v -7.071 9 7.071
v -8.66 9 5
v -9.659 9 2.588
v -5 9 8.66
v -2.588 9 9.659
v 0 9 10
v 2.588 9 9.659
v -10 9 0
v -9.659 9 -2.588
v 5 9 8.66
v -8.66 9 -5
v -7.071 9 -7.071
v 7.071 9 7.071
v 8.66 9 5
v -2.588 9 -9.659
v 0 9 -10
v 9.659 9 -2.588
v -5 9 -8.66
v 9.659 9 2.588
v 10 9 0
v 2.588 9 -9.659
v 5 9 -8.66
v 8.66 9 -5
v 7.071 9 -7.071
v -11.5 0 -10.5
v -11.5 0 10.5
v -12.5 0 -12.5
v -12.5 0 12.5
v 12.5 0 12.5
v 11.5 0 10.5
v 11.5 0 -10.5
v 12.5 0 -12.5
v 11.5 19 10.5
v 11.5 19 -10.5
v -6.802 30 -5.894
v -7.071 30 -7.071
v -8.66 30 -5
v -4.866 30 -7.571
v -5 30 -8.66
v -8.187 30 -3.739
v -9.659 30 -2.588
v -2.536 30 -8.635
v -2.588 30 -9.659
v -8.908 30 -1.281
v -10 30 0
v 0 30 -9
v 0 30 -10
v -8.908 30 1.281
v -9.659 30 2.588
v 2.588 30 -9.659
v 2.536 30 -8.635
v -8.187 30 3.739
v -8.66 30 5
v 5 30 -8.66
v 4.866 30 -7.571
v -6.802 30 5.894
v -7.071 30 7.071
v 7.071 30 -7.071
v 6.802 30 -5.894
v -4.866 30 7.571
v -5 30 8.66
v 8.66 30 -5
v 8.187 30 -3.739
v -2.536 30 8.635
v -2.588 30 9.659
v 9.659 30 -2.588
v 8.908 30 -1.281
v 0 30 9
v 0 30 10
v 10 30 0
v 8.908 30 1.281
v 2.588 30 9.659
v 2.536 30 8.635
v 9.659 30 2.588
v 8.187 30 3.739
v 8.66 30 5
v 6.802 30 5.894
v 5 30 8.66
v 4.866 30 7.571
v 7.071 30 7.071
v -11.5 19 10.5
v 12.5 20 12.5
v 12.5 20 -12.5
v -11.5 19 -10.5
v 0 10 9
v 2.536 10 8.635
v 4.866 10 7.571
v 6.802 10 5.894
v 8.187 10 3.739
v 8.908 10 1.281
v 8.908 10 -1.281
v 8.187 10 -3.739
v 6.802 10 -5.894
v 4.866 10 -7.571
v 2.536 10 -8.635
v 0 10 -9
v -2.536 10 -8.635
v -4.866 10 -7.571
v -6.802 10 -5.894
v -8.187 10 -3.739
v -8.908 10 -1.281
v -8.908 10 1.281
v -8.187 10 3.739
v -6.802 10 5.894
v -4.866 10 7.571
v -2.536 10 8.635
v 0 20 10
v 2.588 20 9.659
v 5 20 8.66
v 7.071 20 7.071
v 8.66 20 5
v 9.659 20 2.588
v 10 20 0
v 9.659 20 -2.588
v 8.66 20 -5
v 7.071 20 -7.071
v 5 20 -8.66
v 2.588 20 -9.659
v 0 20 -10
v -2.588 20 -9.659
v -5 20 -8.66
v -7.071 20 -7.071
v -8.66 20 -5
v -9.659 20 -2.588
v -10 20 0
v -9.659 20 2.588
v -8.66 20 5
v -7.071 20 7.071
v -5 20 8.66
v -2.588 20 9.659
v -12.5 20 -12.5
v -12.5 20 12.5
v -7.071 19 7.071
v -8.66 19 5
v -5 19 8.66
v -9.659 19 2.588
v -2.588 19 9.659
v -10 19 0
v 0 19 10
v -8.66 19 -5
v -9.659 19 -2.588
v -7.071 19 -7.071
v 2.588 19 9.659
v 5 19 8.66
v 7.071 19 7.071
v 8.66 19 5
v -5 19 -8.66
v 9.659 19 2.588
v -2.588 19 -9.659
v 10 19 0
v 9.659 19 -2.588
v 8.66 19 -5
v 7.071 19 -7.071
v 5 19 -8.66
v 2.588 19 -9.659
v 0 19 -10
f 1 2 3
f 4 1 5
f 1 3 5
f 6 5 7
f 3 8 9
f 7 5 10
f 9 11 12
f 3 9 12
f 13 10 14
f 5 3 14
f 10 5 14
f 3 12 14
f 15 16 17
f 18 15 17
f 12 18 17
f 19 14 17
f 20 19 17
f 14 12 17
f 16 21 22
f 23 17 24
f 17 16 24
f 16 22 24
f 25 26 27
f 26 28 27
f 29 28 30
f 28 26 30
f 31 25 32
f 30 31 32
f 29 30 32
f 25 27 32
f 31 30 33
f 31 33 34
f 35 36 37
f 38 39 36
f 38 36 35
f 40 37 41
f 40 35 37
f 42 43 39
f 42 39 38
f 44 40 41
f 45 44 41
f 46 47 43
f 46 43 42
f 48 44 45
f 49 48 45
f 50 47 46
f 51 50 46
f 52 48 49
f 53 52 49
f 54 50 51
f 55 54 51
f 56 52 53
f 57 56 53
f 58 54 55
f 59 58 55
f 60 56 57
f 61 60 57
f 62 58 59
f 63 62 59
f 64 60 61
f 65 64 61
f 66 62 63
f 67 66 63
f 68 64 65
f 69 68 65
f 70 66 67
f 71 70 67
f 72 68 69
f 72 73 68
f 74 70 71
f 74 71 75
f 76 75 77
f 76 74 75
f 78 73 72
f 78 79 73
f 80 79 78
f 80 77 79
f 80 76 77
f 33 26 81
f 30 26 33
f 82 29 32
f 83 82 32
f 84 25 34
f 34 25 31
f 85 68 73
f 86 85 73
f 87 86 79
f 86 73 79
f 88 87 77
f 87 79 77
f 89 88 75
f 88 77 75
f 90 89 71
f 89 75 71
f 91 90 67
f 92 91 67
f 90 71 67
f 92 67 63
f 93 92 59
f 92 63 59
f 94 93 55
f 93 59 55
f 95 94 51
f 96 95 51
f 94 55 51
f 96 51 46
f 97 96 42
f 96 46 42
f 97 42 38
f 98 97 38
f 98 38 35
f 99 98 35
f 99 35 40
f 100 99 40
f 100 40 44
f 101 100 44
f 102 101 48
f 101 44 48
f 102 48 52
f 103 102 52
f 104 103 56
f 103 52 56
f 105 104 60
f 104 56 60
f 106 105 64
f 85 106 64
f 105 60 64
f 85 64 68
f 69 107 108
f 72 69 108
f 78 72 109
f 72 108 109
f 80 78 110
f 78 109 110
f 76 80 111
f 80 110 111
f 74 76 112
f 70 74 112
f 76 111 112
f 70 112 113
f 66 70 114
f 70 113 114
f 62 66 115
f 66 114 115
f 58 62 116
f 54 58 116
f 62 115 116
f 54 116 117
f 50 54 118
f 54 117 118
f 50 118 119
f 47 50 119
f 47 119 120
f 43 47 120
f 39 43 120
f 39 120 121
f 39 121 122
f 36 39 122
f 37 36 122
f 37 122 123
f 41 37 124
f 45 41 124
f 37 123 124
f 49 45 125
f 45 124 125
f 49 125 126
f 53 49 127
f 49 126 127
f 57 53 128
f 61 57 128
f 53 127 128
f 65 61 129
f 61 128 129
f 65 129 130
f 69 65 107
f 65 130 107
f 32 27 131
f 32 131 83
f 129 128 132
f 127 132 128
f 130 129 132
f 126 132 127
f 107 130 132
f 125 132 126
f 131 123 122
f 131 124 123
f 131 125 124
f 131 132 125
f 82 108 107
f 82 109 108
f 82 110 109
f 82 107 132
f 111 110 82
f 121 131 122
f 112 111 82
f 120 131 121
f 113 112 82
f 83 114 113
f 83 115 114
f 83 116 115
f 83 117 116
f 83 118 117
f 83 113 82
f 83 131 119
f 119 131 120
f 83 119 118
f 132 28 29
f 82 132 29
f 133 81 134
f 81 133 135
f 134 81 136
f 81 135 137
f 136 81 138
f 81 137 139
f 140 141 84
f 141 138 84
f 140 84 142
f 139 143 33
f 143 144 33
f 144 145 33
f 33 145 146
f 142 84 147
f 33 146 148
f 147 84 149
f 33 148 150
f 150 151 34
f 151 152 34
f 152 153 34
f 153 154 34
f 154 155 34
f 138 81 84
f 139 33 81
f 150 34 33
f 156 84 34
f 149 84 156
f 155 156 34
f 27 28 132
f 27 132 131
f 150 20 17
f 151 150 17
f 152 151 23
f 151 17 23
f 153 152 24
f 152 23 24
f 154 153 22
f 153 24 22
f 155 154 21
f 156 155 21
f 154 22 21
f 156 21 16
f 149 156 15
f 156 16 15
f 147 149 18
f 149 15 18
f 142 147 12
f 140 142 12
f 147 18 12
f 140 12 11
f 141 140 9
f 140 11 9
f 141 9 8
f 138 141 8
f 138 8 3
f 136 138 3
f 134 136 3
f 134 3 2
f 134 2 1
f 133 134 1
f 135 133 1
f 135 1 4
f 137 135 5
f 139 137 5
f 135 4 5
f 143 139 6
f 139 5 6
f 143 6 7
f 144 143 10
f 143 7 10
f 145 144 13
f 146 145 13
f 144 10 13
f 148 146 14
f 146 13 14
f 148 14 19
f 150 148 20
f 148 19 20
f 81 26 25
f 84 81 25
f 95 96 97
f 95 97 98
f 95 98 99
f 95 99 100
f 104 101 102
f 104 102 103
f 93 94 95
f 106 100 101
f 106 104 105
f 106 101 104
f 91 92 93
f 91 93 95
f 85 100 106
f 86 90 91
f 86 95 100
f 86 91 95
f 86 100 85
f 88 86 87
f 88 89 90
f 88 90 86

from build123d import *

# Parameters (mm, degrees)
CROQUIS1_W              = 25
CROQUIS1_H              = 25
SALIENTE_EXTRUIR1_DEPTH = 20
CROQUIS2_R              = 10
SALIENTE_EXTRUIR2_DEPTH = 10
CROQUIS3_R              = 9
CORTAR_EXTRUIR1_DEPTH   = 20
VACIADO2_OUTLINE_W      = 23
VACIADO2_OUTLINE_H      = 21
VACIADO2_DEPTH          = 9
VACIADO2_START          = 9
VACIADO2_2_OUTLINE_W    = 23
VACIADO2_2_OUTLINE_H    = 21
VACIADO2_2_OUTLINE_R    = 10
VACIADO2_2_DEPTH        = 10


# Read off the part's stored shape, not the designer's step: Vaciado2
with BuildPart() as part:
    # Croquis1 → Saliente-Extruir1 (new body)
    with BuildSketch(Plane(origin=(0, 0, 0), x_dir=(1, 0, 0), z_dir=(0, 1, 0))):
        Rectangle(CROQUIS1_W, CROQUIS1_H)
    extrude(amount=SALIENTE_EXTRUIR1_DEPTH)

    # Croquis2 → Saliente-Extruir2 (add)
    with BuildSketch(Plane(origin=(0, 20, 0), x_dir=(1, 0, 0), z_dir=(0, 1, 0))):
        with Locations(Location((0, 0, 0), (0, 0, 270))):
            Circle(CROQUIS2_R)
    extrude(amount=SALIENTE_EXTRUIR2_DEPTH)

    # Croquis3 → Cortar-Extruir1 (cut)
    with BuildSketch(Plane(origin=(0, 30, 0), x_dir=(1, 0, 0), z_dir=(0, 1, 0))):
        with Locations(Location((0, 0, 0), (0, 0, 270))):
            Circle(CROQUIS3_R)
    extrude(amount=-CORTAR_EXTRUIR1_DEPTH, mode=Mode.SUBTRACT)

    # Vaciado2 outline → Vaciado2 (cut)
    with BuildSketch(Plane(origin=(0, 0, 0), x_dir=(1, 0, 0), z_dir=(0, 1, 0))):
        Rectangle(VACIADO2_OUTLINE_W, VACIADO2_OUTLINE_H)
    extrude(amount=VACIADO2_DEPTH, mode=Mode.SUBTRACT)

    # Vaciado2 2 outline → Vaciado2 2 (cut)
    with BuildSketch(Plane(origin=(0, 0, 0), x_dir=(1, 0, 0), z_dir=(0, 1, 0)).offset(VACIADO2_START)):
        Rectangle(VACIADO2_2_OUTLINE_W, VACIADO2_2_OUTLINE_H)
        Circle(VACIADO2_2_OUTLINE_R, mode=Mode.SUBTRACT)
    extrude(amount=VACIADO2_2_DEPTH, mode=Mode.SUBTRACT)


solid = part.part
